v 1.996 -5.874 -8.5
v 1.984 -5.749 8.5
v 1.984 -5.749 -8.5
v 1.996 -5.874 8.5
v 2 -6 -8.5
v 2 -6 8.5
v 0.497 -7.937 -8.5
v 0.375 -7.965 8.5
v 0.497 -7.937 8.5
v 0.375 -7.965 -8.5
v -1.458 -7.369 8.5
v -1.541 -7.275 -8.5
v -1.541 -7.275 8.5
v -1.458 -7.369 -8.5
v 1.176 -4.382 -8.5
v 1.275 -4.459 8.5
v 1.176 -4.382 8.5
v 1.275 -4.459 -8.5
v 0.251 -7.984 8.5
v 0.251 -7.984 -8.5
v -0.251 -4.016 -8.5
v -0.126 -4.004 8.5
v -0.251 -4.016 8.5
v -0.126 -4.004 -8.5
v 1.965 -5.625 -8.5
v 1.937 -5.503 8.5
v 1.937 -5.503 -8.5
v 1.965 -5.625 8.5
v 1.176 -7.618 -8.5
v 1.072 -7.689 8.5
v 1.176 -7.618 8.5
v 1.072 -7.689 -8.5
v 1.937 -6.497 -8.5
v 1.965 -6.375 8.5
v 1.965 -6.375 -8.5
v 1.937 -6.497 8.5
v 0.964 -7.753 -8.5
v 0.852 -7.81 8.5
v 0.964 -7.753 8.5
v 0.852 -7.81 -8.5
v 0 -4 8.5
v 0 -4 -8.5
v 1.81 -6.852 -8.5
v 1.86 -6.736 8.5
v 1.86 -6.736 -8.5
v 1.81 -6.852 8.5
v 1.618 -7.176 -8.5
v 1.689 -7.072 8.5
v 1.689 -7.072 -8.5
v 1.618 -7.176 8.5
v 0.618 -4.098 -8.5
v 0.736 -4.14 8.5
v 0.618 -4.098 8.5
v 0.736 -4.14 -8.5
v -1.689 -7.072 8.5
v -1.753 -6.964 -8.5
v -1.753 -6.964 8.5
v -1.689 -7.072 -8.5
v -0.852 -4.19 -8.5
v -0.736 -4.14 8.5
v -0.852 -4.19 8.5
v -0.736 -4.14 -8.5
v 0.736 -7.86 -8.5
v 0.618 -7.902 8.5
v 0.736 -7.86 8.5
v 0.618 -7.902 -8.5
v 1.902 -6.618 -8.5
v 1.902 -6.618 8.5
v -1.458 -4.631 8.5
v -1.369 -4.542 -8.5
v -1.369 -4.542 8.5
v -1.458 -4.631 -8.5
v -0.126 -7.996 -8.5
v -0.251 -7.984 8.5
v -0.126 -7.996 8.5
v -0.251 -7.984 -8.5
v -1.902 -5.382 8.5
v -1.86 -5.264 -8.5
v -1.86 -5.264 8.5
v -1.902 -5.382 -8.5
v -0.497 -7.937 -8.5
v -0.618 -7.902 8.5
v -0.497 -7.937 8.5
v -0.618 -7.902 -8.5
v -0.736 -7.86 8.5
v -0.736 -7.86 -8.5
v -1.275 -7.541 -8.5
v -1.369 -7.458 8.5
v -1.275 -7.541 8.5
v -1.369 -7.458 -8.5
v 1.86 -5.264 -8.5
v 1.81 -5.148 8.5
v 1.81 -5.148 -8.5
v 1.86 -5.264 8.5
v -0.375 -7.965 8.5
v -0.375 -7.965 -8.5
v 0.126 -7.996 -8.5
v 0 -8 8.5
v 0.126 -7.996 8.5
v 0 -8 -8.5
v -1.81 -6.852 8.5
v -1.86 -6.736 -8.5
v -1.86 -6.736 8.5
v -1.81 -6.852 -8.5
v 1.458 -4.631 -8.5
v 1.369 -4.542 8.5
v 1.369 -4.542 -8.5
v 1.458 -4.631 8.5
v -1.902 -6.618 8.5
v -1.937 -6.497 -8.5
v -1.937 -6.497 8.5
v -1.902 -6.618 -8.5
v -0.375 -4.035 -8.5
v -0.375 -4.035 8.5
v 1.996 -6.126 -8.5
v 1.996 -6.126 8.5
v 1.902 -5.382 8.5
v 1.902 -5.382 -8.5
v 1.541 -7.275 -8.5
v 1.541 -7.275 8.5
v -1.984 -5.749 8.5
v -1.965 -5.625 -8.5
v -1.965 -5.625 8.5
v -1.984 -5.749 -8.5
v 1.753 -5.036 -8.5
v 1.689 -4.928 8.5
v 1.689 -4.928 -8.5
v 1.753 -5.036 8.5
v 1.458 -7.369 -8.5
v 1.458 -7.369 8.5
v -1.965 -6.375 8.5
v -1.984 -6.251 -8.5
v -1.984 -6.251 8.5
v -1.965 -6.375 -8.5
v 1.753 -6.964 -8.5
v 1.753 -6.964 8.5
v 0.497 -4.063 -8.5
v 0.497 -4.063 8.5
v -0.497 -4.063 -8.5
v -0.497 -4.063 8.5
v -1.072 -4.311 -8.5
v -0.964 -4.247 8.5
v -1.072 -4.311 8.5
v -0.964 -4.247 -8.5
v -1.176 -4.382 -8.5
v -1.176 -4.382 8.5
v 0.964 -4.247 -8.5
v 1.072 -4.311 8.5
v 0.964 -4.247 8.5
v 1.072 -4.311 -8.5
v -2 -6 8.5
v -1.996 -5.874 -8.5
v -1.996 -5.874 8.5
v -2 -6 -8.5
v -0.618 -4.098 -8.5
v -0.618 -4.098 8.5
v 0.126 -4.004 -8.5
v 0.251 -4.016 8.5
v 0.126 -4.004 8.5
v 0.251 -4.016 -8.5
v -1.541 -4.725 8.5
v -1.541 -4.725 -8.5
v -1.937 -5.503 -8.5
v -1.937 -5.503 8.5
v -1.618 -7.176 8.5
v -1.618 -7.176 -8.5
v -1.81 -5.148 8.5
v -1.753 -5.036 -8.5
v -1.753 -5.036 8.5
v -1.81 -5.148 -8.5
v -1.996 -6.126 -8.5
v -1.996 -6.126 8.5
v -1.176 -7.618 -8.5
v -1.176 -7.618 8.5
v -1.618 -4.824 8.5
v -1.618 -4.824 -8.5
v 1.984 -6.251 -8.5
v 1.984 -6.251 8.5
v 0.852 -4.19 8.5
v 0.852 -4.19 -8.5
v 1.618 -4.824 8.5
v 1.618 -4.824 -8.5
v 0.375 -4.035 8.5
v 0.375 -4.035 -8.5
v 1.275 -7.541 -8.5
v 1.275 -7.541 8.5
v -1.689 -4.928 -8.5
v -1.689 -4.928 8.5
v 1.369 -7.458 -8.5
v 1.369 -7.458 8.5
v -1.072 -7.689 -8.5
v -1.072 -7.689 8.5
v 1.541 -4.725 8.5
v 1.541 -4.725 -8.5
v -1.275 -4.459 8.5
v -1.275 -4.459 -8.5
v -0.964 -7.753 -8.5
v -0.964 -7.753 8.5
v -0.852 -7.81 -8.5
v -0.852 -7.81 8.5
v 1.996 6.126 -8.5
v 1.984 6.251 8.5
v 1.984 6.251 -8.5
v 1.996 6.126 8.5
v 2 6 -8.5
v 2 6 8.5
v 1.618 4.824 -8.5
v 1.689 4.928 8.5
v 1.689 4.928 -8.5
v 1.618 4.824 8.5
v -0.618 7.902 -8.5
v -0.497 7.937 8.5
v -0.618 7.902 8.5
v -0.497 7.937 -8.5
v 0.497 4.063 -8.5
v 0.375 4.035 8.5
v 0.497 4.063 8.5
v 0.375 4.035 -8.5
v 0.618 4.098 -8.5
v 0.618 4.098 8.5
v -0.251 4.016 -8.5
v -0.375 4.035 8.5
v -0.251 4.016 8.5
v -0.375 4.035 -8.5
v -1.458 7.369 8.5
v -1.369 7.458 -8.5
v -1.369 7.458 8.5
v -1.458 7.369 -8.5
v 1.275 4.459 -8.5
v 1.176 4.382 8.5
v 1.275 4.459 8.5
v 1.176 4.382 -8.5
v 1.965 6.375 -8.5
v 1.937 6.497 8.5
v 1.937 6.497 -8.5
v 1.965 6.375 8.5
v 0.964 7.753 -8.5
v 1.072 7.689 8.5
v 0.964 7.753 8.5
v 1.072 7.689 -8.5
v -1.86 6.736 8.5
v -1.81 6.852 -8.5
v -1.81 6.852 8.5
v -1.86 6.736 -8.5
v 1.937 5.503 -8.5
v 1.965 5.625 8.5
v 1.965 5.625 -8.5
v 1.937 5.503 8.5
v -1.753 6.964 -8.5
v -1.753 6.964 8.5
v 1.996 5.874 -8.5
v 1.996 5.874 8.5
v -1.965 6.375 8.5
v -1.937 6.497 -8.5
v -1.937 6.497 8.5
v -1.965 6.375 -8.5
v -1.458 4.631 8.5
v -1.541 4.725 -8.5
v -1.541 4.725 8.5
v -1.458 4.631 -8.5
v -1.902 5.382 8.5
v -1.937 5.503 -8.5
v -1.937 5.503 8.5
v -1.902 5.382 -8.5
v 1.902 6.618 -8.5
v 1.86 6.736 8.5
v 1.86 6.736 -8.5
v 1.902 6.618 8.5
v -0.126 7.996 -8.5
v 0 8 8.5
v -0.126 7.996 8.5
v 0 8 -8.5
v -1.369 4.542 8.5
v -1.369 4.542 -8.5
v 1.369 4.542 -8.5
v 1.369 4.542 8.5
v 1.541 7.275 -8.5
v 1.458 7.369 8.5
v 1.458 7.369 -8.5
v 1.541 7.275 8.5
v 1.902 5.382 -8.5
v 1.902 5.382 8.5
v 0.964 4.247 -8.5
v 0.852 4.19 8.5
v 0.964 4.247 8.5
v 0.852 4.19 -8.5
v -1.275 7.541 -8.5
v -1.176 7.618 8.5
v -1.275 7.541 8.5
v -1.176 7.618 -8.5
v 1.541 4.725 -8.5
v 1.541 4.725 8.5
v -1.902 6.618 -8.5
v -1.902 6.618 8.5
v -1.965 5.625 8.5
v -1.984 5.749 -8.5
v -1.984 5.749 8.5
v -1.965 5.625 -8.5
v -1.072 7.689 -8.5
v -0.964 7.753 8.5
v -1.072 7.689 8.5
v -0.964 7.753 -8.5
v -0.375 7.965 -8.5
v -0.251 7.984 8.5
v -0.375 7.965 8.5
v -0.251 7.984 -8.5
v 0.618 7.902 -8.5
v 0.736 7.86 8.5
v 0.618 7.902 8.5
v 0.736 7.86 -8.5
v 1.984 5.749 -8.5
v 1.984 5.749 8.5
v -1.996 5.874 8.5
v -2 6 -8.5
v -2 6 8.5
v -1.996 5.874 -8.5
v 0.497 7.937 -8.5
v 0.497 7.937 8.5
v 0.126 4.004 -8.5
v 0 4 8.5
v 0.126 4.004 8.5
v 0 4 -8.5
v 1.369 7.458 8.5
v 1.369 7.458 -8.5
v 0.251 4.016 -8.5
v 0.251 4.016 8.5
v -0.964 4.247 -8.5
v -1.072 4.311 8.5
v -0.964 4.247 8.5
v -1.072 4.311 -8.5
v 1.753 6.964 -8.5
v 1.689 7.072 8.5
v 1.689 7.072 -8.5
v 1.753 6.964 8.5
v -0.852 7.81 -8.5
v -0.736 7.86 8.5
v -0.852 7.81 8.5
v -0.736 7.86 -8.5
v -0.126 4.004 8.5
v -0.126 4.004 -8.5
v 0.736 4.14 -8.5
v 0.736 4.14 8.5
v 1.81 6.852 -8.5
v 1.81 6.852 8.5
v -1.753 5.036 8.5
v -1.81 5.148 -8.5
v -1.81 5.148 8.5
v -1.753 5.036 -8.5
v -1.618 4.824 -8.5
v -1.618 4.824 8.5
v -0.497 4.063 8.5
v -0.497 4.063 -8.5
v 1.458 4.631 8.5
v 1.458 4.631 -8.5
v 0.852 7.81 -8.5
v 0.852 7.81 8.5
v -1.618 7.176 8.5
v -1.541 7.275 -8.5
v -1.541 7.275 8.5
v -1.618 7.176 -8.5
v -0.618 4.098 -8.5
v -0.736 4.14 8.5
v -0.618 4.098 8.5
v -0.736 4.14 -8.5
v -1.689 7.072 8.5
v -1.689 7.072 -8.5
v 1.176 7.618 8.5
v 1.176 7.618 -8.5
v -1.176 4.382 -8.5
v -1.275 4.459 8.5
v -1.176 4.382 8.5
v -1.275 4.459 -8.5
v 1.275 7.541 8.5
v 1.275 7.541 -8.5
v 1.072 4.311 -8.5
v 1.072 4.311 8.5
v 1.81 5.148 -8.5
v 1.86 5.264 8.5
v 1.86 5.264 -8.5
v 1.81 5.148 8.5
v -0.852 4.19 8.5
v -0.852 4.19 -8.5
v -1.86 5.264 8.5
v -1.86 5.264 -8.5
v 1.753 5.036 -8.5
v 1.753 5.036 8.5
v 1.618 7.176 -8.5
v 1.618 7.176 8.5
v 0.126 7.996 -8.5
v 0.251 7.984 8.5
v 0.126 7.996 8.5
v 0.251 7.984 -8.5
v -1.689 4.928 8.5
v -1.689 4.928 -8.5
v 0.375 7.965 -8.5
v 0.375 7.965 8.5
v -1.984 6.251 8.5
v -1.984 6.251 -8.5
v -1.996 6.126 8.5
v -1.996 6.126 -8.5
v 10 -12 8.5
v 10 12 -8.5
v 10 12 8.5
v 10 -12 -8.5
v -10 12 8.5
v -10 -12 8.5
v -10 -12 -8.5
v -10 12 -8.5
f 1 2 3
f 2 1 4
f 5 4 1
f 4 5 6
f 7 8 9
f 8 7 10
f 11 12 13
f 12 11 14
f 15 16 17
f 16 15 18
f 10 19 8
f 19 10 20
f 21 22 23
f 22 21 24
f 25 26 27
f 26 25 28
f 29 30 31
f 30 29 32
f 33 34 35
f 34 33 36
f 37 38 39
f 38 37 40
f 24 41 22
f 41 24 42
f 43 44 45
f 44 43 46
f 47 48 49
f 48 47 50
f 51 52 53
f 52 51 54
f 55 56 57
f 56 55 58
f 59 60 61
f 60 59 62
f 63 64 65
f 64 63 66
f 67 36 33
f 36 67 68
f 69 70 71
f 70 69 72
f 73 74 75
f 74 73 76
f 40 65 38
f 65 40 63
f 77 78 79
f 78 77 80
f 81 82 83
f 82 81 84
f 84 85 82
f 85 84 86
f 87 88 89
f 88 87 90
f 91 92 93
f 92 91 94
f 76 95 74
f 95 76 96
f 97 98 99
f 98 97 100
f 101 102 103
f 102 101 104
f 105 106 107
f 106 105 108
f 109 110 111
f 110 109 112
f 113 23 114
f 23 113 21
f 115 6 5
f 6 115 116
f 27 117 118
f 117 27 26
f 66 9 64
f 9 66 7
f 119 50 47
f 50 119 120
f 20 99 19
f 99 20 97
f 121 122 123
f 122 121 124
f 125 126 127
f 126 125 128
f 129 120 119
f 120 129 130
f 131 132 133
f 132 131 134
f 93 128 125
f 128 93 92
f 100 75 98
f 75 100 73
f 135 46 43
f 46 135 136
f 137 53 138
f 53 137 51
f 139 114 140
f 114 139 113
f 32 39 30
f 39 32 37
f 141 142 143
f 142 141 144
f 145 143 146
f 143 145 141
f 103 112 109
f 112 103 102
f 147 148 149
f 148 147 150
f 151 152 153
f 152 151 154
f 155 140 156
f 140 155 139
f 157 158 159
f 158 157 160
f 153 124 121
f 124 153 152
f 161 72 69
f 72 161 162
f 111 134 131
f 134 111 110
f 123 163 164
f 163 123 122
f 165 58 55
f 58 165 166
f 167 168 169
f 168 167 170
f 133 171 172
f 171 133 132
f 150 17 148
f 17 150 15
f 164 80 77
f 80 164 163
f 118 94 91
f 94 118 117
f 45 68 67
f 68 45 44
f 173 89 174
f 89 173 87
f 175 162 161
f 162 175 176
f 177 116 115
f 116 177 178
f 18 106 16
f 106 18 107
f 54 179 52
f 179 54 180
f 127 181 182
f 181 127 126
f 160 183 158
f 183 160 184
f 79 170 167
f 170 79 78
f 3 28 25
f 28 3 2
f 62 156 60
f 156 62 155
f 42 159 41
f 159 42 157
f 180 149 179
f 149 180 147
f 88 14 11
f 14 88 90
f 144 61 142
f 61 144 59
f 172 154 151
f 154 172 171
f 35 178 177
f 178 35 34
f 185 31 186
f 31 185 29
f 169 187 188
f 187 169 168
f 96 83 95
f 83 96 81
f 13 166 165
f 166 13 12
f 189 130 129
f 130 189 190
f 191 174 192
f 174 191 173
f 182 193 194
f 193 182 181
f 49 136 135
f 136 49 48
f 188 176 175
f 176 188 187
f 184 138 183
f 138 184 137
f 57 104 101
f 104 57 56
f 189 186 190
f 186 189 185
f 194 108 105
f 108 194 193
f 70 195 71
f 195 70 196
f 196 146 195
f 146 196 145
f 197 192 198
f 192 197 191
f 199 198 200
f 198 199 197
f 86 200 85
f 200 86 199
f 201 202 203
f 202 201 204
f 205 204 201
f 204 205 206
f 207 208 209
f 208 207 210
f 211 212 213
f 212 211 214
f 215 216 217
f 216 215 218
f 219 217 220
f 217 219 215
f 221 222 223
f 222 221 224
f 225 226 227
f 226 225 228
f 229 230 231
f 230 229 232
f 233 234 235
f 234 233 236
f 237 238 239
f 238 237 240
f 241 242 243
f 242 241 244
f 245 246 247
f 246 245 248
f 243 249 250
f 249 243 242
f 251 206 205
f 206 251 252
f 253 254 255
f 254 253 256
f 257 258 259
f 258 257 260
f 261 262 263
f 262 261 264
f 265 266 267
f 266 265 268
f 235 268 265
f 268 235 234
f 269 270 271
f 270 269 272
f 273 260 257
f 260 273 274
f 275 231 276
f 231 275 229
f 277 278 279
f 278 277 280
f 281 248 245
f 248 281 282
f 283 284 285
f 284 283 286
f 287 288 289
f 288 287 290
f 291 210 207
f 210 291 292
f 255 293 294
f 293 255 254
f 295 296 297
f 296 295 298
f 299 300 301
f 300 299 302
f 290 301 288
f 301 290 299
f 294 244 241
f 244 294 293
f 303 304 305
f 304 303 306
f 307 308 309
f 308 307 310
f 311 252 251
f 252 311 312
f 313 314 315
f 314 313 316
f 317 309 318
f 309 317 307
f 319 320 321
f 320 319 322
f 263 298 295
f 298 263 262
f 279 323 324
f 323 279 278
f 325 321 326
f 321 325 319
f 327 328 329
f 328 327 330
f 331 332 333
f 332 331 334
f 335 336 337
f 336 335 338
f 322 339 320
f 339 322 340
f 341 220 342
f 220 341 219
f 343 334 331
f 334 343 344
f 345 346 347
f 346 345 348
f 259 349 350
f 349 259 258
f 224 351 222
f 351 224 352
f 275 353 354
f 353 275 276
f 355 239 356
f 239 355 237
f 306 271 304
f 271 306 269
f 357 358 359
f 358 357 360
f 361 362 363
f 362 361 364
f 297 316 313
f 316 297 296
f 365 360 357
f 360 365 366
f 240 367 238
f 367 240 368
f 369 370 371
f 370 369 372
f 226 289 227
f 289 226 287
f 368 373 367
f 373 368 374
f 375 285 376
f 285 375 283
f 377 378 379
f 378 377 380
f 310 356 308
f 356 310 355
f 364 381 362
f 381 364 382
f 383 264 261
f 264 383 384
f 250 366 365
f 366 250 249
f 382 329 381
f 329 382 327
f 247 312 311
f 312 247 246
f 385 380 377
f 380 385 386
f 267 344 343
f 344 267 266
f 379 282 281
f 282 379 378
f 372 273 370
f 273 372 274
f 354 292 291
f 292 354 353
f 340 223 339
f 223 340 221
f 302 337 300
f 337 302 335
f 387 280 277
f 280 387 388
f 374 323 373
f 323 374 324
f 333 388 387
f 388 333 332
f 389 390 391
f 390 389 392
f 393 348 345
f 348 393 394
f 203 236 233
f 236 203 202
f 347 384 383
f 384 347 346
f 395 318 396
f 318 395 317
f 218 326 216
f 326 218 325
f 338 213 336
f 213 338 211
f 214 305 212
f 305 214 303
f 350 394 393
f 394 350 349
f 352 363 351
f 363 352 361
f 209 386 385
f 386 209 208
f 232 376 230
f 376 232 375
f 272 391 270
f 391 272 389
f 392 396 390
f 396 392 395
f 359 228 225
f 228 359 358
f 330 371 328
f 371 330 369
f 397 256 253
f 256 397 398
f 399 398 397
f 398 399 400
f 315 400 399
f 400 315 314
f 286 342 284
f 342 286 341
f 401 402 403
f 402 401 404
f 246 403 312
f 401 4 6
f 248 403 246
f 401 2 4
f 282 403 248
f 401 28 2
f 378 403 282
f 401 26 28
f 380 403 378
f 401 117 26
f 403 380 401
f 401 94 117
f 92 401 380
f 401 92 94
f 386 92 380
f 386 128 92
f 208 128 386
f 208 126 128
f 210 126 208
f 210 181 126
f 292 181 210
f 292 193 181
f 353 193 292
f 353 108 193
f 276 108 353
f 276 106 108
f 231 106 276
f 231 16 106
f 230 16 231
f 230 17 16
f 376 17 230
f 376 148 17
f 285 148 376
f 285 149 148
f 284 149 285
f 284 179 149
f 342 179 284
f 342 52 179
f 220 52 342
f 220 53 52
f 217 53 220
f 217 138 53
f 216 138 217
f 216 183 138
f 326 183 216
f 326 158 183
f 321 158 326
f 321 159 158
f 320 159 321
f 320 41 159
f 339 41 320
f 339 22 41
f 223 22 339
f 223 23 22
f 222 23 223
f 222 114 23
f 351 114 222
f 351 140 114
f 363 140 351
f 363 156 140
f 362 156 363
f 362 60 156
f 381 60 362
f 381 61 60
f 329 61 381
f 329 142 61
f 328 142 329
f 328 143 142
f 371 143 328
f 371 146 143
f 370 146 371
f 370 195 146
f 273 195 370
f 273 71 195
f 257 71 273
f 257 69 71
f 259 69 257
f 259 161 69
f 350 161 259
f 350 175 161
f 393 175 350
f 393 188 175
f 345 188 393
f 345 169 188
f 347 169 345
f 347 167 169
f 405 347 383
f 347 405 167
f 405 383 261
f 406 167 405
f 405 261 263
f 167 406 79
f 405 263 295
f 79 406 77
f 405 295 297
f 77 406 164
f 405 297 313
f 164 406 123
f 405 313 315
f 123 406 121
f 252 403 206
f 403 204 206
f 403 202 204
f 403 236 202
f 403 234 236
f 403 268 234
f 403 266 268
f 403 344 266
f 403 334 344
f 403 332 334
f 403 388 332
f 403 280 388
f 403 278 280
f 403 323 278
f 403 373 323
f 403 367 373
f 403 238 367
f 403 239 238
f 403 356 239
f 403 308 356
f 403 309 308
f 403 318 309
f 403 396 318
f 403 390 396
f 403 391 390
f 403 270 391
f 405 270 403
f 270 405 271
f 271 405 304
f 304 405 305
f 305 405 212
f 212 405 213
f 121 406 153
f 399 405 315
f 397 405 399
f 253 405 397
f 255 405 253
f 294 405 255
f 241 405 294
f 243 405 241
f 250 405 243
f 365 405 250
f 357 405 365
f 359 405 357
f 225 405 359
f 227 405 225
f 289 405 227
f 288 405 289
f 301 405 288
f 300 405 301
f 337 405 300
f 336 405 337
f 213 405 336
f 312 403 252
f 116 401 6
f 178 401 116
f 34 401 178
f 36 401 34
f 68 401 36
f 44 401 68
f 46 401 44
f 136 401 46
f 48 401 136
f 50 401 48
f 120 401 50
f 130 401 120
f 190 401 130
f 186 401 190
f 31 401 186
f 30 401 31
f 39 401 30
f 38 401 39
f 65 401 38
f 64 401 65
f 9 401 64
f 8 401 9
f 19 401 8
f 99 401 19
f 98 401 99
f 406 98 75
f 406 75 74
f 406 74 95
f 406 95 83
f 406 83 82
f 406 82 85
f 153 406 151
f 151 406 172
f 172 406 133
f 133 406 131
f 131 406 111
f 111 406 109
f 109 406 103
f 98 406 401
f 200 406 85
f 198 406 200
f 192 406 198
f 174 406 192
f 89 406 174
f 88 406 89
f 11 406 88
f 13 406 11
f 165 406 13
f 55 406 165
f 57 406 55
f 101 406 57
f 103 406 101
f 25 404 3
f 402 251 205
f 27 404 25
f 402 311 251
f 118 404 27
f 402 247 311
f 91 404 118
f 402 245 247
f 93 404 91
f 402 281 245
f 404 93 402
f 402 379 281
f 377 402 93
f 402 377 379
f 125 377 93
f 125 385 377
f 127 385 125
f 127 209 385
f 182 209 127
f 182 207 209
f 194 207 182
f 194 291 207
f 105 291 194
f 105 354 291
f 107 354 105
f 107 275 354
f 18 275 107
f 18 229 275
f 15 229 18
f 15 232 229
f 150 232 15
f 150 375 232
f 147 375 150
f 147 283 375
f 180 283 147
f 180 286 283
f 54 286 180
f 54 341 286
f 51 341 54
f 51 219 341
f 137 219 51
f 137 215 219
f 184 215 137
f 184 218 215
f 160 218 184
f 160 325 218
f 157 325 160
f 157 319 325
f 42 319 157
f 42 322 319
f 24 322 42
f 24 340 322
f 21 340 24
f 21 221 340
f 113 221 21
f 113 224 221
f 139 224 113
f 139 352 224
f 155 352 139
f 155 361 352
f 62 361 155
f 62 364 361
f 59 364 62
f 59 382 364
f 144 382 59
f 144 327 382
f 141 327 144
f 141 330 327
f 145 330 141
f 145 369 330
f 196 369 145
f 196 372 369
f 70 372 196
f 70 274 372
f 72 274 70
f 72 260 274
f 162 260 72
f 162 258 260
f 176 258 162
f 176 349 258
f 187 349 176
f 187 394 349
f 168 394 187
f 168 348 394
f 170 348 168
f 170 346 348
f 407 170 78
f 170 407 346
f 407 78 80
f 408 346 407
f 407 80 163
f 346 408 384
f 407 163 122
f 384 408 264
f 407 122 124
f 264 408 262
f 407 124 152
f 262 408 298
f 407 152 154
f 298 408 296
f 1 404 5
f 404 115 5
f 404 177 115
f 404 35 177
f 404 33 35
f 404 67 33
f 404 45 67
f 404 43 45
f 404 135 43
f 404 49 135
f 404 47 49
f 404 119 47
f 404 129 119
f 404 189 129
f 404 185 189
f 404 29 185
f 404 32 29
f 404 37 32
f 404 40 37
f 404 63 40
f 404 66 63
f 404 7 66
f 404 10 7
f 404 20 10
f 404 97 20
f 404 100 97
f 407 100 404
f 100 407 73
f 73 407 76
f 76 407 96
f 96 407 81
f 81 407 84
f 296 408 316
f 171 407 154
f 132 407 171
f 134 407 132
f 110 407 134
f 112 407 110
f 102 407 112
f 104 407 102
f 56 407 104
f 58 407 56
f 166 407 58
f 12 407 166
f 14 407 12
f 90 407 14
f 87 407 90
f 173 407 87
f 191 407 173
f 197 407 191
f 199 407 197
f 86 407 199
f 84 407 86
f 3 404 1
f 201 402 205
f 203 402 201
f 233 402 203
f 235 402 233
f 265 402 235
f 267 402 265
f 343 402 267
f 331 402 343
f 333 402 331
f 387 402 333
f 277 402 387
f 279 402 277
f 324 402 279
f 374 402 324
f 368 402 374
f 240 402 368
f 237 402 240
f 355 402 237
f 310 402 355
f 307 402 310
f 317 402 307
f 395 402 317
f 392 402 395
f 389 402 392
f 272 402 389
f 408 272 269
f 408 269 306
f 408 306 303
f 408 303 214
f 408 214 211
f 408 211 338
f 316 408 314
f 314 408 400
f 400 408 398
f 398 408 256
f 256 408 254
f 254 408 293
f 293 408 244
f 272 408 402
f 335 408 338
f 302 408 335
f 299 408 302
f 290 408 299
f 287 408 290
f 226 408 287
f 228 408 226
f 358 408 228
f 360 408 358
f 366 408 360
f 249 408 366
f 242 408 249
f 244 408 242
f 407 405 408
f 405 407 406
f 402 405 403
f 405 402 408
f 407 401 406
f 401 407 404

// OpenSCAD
diam_tnut 			= 4;
longueur 			= 20;
largeur 			= 24;

hauteur_calle 		= 17;

fn 					= 100;


difference(){
	cube([longueur, largeur, hauteur_calle], center = true, $fn = fn);
	for(i = [-6 , 6]){
		translate([0, i, 0]){
			cylinder(d = diam_tnut, h = hauteur_calle + 2, center = true, $fn = fn);
		}
	}
	
}
